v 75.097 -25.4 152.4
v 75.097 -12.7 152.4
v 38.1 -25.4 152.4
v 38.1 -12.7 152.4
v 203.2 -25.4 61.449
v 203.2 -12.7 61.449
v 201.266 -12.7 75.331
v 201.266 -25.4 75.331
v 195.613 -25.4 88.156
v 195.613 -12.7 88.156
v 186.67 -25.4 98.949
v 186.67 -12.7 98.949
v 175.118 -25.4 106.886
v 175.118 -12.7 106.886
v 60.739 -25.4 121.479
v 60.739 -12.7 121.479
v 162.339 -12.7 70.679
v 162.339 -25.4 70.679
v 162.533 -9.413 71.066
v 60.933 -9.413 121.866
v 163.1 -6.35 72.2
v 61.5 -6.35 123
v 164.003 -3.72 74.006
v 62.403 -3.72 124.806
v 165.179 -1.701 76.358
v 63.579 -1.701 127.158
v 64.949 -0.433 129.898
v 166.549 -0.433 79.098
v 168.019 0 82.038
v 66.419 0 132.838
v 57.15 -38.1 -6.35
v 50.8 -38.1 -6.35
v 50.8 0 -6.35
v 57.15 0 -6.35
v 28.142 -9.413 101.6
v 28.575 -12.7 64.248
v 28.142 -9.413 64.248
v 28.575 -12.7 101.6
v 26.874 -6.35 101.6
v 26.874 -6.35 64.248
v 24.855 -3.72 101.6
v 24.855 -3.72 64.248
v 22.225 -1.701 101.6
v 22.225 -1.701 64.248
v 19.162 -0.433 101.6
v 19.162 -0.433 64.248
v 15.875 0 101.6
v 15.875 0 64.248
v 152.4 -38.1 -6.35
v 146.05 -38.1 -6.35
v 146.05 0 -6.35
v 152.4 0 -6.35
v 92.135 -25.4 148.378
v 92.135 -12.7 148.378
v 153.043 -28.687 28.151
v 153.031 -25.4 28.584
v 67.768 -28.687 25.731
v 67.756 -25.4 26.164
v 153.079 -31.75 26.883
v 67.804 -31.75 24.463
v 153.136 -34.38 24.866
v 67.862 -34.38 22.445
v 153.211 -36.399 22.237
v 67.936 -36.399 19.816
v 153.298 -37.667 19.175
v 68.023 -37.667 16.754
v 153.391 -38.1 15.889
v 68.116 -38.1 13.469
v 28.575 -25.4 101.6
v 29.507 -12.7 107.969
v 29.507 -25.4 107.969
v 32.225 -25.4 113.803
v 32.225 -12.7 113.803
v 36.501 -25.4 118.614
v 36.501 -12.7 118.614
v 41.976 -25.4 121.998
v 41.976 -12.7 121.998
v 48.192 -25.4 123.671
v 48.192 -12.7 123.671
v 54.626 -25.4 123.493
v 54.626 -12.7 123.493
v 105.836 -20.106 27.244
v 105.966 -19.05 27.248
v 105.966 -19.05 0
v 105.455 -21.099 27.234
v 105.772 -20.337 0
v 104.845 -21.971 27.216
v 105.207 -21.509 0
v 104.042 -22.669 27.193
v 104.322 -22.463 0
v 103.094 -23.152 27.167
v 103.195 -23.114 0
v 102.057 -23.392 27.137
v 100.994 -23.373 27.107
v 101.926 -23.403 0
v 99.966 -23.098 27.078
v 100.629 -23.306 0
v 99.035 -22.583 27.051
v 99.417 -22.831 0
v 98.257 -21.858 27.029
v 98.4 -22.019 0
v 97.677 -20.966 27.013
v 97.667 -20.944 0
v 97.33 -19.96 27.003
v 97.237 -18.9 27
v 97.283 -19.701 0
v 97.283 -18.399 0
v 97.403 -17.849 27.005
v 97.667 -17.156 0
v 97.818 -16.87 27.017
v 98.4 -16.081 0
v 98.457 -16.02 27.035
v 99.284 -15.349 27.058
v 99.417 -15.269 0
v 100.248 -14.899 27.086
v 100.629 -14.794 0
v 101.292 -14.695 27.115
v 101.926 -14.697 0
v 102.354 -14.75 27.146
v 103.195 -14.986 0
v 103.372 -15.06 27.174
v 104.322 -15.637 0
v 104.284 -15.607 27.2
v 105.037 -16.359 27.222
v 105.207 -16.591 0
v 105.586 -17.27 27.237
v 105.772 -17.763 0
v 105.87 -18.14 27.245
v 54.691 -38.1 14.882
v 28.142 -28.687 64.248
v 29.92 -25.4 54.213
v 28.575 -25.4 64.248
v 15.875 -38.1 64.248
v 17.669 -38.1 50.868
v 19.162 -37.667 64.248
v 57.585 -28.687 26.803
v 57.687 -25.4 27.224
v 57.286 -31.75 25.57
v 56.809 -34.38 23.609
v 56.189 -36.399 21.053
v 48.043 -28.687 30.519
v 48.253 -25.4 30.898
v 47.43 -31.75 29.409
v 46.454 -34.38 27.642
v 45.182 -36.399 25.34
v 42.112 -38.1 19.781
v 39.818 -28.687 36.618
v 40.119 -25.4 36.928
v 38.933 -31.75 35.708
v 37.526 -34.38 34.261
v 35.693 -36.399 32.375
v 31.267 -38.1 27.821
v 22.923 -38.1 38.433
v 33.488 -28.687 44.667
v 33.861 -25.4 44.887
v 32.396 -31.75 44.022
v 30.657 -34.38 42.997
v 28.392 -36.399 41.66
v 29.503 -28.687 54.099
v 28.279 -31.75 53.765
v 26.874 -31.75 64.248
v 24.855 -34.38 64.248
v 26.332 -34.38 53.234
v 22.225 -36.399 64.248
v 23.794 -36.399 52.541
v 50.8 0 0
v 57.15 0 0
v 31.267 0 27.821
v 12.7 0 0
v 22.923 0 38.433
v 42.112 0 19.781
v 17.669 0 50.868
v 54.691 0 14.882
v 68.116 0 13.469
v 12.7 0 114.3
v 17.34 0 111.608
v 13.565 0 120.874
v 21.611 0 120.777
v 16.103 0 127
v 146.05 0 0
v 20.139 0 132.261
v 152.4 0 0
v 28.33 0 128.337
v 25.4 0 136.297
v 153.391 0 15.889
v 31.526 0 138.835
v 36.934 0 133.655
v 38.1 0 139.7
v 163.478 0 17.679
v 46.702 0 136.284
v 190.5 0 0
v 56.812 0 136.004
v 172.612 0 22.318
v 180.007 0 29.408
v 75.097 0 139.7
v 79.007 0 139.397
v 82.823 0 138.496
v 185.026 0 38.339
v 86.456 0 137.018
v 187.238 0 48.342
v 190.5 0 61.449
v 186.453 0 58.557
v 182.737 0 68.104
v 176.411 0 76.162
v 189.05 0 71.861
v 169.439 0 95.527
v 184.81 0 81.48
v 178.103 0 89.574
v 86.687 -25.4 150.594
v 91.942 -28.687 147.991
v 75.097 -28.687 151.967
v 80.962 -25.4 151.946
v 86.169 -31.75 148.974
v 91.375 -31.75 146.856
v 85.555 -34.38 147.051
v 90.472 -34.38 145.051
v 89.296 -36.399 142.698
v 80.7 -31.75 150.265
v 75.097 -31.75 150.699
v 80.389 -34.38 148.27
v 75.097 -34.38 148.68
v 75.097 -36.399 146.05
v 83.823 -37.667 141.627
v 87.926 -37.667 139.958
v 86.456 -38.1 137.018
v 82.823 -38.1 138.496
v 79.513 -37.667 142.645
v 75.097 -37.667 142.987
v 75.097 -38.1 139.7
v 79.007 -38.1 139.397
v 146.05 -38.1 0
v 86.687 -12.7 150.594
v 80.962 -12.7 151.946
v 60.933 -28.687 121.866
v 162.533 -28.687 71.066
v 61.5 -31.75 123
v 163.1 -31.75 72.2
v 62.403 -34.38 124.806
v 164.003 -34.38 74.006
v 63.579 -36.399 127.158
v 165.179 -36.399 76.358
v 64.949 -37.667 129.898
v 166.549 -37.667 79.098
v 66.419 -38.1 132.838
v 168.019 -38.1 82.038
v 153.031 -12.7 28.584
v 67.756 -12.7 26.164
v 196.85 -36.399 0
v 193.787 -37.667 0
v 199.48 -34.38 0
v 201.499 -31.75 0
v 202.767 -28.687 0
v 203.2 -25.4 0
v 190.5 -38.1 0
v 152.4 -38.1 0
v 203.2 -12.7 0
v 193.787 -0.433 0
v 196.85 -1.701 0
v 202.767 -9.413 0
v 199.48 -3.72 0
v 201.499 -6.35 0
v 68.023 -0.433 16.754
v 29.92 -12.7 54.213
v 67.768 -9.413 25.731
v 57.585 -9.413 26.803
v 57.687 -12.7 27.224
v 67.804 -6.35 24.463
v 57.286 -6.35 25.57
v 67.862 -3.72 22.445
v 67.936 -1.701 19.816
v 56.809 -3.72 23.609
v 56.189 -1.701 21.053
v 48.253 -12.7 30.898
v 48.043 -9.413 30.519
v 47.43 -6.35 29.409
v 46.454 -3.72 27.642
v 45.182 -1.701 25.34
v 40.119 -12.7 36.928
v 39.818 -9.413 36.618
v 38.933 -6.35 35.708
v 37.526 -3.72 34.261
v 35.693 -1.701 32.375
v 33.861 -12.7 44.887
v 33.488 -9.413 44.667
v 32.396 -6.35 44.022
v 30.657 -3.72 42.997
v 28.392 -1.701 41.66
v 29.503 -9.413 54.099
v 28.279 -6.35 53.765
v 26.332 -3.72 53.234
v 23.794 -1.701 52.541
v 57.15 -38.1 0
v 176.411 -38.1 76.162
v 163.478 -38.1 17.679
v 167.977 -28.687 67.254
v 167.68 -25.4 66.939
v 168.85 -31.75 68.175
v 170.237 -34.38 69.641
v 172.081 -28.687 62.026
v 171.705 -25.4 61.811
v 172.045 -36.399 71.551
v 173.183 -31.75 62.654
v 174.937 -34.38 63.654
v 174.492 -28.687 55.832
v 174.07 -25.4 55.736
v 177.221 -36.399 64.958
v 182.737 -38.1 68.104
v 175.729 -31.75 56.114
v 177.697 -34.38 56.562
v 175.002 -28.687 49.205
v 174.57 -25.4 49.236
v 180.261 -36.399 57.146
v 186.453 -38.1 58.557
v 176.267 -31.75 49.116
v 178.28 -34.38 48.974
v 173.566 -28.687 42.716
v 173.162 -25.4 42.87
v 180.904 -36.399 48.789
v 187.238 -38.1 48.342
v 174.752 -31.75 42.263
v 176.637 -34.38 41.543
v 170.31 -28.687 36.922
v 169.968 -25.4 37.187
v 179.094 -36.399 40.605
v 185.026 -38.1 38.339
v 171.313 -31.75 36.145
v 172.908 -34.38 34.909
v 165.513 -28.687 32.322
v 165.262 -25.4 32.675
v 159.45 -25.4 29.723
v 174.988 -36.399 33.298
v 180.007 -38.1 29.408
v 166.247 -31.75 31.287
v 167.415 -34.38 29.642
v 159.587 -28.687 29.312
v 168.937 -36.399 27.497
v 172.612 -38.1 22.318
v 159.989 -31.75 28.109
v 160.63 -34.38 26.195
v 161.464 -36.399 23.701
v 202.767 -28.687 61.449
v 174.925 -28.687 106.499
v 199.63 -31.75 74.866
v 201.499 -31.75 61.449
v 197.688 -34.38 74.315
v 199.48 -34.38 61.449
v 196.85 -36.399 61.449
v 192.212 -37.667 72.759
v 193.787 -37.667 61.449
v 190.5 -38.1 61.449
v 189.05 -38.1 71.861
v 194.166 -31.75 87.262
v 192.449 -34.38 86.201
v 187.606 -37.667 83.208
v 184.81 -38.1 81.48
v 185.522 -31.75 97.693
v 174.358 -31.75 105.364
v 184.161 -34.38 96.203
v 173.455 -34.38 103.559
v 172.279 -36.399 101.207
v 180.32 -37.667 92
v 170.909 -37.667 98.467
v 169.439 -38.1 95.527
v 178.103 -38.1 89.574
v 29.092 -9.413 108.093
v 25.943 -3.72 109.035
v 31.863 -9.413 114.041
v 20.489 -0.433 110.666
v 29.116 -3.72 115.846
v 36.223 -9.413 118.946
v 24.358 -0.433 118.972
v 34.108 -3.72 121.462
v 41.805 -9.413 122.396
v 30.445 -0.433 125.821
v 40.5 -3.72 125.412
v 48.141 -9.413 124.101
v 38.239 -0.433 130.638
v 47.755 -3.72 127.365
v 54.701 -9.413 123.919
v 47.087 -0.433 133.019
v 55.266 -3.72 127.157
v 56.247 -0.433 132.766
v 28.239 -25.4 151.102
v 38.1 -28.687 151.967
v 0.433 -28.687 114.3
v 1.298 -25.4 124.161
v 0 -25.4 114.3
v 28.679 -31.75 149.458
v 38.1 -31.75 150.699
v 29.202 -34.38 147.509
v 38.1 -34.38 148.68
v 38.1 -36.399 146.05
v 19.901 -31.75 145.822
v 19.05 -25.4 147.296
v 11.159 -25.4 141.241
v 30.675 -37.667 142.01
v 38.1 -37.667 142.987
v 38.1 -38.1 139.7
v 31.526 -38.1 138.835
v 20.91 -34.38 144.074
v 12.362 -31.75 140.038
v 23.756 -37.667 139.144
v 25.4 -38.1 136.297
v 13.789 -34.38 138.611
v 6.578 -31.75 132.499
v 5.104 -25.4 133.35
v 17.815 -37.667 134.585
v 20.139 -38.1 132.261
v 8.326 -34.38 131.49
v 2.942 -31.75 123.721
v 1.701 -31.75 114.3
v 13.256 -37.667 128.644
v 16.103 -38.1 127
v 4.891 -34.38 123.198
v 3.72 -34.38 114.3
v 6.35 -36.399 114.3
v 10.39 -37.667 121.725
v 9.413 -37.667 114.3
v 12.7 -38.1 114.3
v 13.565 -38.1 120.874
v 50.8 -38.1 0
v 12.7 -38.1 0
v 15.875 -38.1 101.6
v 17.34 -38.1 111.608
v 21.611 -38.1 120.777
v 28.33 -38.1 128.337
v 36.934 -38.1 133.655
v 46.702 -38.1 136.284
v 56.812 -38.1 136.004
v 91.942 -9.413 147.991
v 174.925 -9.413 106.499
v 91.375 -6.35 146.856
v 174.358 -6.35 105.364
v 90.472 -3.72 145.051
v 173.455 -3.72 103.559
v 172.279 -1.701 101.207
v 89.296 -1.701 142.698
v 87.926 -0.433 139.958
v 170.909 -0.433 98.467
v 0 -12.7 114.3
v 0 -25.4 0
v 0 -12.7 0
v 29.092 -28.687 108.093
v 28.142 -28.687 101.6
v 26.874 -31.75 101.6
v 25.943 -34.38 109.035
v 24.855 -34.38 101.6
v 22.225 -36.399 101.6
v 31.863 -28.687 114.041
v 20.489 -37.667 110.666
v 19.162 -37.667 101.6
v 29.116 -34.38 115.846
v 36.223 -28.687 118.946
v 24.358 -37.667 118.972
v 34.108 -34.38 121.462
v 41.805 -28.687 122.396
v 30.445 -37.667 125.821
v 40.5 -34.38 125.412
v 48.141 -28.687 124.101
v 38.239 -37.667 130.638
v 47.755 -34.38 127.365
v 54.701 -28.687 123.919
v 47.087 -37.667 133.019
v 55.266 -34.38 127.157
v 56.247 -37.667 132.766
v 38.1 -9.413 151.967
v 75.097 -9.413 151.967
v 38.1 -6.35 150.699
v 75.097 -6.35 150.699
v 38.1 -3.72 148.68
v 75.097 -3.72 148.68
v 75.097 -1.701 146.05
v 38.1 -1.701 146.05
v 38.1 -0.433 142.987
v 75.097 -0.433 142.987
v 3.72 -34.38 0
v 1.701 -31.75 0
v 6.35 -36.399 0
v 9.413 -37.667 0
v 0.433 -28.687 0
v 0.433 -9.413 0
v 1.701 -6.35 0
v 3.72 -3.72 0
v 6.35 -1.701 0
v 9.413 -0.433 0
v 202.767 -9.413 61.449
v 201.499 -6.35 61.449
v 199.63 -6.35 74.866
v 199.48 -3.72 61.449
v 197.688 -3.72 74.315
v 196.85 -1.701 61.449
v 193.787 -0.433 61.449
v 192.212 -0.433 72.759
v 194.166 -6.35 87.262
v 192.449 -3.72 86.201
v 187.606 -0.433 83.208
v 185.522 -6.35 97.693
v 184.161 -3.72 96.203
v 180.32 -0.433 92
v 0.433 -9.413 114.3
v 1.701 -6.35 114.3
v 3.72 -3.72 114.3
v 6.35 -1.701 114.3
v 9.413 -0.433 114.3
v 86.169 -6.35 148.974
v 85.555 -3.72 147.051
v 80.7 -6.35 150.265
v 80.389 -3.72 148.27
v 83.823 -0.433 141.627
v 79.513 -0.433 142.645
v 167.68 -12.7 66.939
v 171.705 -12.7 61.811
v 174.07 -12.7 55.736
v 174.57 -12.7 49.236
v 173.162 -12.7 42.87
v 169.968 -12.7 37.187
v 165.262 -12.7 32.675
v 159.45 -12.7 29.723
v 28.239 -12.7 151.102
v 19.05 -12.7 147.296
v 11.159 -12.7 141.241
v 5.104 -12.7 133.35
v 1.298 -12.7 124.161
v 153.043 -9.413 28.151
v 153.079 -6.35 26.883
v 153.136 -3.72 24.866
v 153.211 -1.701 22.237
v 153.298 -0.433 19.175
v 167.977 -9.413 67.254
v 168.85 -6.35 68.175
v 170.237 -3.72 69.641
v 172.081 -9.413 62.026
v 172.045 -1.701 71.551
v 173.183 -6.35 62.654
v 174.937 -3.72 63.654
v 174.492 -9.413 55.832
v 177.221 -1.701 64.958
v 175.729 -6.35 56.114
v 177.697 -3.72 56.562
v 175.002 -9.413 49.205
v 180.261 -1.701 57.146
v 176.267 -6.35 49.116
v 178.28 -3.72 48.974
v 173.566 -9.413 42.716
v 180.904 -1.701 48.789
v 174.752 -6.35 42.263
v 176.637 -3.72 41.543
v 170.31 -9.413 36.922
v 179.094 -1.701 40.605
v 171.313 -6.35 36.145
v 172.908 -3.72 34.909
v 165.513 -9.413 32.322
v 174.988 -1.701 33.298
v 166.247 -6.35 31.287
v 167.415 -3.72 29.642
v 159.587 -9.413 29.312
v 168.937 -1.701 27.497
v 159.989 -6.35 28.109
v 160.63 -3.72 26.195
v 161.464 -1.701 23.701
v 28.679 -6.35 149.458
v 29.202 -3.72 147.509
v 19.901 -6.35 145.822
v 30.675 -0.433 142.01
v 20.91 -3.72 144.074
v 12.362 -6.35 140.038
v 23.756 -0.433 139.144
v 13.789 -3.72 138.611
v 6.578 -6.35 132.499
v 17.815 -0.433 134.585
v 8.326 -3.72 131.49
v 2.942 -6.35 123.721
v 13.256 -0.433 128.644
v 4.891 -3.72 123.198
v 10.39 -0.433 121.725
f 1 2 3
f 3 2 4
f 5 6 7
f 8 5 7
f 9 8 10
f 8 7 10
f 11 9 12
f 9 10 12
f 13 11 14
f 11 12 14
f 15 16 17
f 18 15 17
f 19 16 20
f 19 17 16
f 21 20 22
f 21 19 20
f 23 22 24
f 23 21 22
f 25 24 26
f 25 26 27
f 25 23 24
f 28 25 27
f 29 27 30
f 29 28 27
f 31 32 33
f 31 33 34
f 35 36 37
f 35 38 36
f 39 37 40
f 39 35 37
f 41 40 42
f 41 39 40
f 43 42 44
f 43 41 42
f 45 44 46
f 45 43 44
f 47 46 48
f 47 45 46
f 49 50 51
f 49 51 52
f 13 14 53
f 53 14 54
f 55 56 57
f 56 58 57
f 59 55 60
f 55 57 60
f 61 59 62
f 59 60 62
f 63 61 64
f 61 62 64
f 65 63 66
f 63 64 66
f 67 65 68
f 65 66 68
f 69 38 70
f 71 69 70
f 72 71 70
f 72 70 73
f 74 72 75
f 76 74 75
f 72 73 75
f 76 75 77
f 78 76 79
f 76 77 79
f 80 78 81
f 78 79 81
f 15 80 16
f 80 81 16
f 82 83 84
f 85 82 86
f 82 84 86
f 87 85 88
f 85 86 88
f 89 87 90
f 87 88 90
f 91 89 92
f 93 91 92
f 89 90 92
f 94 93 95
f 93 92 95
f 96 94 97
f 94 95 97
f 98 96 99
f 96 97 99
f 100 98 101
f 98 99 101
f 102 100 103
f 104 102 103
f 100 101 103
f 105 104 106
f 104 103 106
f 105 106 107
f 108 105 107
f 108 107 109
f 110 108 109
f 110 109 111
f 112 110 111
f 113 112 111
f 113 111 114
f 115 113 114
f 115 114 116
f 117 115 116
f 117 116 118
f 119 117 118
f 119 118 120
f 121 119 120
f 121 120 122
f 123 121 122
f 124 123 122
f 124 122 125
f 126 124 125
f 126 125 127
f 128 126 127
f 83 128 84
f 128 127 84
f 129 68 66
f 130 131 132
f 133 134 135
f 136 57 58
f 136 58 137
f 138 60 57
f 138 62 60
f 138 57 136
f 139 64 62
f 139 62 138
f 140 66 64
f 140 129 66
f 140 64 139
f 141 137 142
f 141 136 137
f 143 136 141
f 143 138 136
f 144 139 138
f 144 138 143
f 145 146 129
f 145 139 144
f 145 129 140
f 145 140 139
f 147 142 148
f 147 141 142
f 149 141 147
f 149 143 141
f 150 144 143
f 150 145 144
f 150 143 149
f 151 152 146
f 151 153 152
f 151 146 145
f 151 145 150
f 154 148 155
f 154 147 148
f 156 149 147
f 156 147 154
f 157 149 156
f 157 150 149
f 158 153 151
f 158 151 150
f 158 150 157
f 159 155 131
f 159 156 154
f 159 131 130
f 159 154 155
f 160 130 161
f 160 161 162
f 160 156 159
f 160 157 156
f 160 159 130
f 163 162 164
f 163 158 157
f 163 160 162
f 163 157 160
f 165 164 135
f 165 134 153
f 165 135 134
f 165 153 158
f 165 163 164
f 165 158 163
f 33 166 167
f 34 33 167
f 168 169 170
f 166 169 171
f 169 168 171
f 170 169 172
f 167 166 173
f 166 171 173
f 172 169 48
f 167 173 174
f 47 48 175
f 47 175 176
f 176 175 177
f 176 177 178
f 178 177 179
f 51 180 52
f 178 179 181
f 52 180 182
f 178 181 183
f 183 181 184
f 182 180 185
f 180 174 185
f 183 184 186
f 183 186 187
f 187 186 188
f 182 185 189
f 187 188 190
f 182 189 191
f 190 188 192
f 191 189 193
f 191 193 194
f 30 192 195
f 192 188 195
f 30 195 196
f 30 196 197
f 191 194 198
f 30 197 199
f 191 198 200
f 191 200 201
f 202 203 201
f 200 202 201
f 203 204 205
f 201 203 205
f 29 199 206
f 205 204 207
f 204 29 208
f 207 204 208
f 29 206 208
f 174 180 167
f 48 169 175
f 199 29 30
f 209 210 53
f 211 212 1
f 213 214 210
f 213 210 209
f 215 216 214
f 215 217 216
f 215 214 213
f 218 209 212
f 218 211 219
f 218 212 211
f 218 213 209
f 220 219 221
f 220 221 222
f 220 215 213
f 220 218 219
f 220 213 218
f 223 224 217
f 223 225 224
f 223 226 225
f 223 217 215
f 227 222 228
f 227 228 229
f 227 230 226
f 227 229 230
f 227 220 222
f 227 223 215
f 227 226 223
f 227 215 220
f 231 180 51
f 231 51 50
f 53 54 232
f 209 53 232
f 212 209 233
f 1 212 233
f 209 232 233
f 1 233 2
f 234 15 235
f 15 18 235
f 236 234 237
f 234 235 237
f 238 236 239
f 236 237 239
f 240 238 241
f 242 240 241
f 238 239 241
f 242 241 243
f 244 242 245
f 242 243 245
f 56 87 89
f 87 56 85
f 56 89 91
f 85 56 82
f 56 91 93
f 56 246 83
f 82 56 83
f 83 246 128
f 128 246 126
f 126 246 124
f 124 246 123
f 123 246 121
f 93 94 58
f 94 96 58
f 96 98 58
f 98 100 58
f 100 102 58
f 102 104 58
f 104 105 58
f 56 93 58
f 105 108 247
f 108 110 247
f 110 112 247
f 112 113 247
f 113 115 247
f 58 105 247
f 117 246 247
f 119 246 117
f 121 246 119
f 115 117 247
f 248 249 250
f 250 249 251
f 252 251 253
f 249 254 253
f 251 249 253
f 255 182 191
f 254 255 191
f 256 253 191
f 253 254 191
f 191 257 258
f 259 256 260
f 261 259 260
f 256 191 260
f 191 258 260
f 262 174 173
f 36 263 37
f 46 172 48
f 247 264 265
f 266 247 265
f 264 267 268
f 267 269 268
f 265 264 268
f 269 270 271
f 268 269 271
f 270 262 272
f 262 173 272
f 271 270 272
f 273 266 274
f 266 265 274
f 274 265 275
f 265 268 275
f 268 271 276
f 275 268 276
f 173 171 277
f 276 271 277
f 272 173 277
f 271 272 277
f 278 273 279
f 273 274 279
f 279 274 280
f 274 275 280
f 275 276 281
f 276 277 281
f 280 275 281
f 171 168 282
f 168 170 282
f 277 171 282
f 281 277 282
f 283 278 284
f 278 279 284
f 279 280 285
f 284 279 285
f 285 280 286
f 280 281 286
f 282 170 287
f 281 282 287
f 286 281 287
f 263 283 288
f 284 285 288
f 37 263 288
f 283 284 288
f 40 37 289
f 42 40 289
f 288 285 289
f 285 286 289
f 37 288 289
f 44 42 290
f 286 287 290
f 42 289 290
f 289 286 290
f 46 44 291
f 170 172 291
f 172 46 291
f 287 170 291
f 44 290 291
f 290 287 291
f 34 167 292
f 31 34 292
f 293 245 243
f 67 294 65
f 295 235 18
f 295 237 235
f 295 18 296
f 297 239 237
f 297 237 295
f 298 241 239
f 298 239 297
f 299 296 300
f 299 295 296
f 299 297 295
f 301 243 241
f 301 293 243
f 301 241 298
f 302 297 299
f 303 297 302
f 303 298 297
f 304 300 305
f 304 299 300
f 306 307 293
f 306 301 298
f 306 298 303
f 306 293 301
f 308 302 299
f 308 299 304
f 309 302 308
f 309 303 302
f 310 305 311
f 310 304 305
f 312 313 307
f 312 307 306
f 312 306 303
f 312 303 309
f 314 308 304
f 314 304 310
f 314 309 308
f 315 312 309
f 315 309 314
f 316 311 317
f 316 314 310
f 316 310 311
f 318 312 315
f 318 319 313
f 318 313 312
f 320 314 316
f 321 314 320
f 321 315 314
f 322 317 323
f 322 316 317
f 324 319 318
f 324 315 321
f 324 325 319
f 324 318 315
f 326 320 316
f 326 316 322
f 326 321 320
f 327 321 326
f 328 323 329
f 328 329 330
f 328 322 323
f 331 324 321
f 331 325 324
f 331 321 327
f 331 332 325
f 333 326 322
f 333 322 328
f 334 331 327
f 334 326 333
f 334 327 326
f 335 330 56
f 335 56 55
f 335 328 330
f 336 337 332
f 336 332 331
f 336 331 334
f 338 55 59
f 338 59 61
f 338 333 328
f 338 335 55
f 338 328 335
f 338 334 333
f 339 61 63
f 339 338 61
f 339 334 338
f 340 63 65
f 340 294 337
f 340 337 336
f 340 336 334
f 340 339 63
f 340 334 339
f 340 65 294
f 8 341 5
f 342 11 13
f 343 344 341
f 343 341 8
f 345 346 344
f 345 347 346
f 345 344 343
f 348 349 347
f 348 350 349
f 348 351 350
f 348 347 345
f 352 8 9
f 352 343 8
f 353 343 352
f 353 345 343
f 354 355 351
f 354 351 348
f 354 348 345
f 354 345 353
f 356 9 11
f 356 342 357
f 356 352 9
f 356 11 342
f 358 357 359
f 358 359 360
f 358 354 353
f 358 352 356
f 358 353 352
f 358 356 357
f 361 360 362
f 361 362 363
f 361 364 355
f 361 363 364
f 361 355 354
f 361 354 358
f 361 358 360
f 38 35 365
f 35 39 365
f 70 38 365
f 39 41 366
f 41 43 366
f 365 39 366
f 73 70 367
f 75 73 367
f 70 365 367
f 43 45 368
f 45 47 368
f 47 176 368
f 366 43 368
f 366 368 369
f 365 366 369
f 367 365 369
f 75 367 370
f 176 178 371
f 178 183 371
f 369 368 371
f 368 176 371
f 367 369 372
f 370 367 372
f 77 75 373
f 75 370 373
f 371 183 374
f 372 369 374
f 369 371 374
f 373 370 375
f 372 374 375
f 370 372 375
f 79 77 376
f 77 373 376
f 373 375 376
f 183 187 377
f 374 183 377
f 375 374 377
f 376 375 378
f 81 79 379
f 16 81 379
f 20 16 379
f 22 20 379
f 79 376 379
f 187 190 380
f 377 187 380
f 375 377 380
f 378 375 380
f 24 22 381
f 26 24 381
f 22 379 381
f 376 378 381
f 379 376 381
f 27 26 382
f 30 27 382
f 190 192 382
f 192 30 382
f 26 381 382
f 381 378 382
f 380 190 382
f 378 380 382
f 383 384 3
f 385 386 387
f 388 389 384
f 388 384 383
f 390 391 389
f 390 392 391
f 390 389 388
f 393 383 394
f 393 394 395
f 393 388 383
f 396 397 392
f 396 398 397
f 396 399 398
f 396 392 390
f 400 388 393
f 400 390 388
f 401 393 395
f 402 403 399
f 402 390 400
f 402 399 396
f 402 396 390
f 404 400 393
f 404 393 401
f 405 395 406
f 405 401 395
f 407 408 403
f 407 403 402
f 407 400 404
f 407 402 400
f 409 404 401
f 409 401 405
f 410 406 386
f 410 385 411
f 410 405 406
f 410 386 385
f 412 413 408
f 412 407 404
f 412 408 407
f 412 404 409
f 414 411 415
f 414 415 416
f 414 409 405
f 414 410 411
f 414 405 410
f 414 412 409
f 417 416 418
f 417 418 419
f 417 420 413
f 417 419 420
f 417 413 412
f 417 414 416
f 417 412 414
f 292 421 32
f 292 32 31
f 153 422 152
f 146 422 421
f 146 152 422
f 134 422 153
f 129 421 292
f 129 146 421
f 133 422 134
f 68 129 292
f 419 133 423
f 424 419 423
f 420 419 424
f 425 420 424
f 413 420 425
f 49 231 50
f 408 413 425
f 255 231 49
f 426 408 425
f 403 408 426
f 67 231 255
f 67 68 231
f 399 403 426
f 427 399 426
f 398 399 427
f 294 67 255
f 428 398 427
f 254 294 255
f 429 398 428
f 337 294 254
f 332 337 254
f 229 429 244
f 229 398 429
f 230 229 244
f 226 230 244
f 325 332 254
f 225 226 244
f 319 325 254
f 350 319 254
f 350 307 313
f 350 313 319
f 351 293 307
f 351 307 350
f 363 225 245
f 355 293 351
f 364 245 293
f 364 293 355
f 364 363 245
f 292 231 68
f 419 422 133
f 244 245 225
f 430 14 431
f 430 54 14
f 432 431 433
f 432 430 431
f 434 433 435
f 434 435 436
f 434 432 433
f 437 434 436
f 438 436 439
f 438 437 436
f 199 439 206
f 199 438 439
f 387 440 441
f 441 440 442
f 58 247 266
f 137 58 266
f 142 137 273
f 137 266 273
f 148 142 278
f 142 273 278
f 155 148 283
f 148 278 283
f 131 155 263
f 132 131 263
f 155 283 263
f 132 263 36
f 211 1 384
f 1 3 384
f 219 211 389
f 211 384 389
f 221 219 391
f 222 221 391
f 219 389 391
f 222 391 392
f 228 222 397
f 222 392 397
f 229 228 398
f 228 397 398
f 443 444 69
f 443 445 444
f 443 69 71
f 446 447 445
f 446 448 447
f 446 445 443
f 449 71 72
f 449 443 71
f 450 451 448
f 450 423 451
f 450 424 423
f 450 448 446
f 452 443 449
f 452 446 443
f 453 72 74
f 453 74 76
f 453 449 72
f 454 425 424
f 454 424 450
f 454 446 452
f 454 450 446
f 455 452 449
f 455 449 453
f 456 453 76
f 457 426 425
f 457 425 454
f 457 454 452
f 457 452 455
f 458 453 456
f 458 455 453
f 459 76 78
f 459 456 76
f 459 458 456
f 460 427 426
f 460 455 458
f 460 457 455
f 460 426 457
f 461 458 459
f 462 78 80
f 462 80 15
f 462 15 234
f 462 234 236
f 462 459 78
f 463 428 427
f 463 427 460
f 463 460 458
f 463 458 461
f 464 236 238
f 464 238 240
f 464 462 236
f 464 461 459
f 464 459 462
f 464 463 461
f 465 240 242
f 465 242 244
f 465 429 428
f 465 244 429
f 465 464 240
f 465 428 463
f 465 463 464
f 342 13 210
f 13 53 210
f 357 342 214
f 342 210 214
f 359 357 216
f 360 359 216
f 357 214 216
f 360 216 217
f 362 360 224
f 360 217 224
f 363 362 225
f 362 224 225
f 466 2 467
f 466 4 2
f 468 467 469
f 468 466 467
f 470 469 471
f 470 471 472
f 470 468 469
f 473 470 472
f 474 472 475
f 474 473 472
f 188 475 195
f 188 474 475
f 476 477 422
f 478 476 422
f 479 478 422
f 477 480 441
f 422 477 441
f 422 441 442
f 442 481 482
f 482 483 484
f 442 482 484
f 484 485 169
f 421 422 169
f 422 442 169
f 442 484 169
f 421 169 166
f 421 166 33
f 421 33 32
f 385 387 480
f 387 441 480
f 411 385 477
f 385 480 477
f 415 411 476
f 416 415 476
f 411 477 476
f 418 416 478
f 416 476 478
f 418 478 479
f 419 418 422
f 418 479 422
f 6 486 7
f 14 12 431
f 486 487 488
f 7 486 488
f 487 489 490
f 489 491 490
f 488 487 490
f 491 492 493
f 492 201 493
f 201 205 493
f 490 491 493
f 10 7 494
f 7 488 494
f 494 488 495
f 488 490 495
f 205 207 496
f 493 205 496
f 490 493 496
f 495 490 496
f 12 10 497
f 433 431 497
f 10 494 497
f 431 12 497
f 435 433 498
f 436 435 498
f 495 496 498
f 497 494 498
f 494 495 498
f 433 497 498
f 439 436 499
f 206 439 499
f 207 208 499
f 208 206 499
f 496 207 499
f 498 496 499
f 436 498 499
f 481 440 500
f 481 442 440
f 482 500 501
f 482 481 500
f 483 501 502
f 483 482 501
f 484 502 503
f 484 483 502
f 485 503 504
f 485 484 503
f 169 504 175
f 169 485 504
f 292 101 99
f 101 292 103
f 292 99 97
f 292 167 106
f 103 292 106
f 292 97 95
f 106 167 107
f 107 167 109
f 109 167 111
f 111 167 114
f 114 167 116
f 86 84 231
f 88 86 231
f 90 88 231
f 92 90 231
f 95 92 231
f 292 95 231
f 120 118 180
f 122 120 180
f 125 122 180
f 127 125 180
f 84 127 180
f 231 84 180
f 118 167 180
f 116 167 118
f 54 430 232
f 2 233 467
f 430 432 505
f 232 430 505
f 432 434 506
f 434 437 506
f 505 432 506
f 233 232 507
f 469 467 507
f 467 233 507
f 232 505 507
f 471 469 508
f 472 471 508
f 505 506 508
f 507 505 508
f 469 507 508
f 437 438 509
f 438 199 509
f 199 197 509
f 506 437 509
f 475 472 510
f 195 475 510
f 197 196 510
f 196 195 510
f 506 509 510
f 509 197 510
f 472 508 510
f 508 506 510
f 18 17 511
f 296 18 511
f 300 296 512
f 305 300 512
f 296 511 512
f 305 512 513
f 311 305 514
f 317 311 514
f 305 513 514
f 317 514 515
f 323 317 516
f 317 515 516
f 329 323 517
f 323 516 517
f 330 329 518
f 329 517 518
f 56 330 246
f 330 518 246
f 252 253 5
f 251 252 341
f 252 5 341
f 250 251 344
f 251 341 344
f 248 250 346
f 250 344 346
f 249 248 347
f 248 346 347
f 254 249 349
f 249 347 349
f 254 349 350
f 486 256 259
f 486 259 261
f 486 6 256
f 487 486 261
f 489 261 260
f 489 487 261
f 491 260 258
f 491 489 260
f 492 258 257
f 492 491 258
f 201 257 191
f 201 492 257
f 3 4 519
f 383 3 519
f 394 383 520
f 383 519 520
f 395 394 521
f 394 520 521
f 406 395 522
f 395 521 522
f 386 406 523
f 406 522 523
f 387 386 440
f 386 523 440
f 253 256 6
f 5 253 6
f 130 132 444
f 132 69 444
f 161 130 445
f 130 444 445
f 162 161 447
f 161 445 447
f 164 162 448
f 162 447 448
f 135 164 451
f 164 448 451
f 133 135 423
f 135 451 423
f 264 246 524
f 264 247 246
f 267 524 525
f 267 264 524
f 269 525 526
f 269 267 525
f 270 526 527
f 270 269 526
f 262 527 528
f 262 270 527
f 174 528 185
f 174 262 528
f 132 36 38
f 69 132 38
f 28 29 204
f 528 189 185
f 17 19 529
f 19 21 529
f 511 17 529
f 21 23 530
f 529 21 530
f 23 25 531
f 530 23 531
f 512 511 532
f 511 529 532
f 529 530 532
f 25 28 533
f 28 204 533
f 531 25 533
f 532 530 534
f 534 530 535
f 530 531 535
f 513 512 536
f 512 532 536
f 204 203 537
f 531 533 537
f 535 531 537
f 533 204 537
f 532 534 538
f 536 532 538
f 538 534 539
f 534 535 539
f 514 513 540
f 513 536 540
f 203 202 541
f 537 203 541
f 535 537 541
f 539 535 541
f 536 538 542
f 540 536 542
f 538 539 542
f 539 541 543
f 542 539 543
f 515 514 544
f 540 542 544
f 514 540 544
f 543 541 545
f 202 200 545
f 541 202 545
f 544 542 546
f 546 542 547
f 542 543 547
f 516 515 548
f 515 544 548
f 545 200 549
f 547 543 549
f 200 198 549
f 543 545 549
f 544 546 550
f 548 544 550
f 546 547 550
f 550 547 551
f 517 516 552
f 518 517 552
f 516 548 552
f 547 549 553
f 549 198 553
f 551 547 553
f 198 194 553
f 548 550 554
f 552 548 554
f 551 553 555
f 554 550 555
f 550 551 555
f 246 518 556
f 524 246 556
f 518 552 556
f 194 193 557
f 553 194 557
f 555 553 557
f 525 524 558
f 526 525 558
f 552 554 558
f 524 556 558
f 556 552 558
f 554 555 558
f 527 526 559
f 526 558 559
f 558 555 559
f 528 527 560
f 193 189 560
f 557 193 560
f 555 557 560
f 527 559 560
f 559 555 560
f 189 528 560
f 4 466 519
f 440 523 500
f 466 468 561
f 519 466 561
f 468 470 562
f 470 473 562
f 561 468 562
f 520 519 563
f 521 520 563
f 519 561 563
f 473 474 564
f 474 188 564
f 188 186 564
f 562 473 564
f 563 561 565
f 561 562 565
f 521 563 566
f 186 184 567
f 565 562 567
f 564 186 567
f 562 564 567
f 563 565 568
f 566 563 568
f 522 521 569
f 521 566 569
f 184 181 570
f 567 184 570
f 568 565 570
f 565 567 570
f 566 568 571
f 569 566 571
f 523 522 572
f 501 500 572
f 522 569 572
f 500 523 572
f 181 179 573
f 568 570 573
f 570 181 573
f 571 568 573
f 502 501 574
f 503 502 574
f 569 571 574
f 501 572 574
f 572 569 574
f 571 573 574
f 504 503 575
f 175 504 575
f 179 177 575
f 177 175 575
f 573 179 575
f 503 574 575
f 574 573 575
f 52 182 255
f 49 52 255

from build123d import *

# Parameters (mm, degrees)
F1_DEPTH = 38.1
F2_R     = 12.7
F3_R     = 4.365625
F4_DEPTH = 27.2490523559
F5_W     = 6.35
F5_H     = 38.1
F6_DEPTH = 6.35


with BuildPart() as f1:
    # F0 (on Front) → F1 (new body)
    with BuildSketch(Plane.XZ):
        with BuildLine():
            Line((0, 114.3), (0, 0))
            Line((0, 0), (203.2, 0))
            Line((203.2, 0), (203.2, 61.4492737428))
            ThreePointArc((203.2, 61.4492737428), (195.6130610643, 88.1564142385), (175.1184506514, 106.8861750456))
            Line((175.1184506514, 106.8861750456), (92.1354487885, 148.3776759771))
            ThreePointArc((92.1354487885, 148.3776759771), (83.8501970728, 151.3807864987), (75.0966107999, 152.4))
            Line((75.0966107999, 152.4), (38.1, 152.4))
            ThreePointArc((38.1, 152.4), (11.1592316368, 141.2407683632), (0, 114.3))
        make_face()
        with BuildLine():
            ThreePointArc((28.575, 101.6), (39.1156260332, 120.5057142156), (60.73932216, 121.47864432))
            Line((60.73932216, 121.47864432), (162.33932216, 70.67864432))
            ThreePointArc((162.33932216, 70.67864432), (174.100727981, 46.0011428347), (153.0305820147, 28.5839474406))
            Line((153.0305820147, 28.5839474406), (67.7559977395, 26.1635075802))
            ThreePointArc((67.7559977395, 26.1635075802), (40.119172145, 36.9278834801), (28.575, 64.2481691106))
            Line((28.575, 64.2481691106), (28.575, 101.6))
        make_face(mode=Mode.SUBTRACT)
    extrude(amount=F1_DEPTH)

    # F2
    f2_edges = [f1.edges().sort_by_distance(p)[0] for p in [
        (56.598305, -38.1, 152.4),
        (111.539322, -38.1, 96.078644),
        (111.539322, 0, 96.078644),
        (133.62695, 0, 127.631926),
    ]]
    fillet(f2_edges, radius=F2_R)

    # F3 (on face) → F4 (cut, through all)
    with BuildSketch(Plane(origin=(0, 0, 0), x_dir=(1, 0, 0), z_dir=(0, 0, -1))):
        with Locations((101.6, 19.05)):
            Circle(F3_R)
    extrude(amount=-F4_DEPTH, mode=Mode.SUBTRACT)

    # F5 (on face) → F6 (join)
    with BuildSketch(Plane(origin=(0, 0, 0), x_dir=(1, 0, 0), z_dir=(0, 0, -1))):
        with Locations((53.975, 19.05)):
            Rectangle(F5_W, F5_H)
        with Locations((149.225, 19.05)):
            Rectangle(F5_W, F5_H)
    extrude(amount=F6_DEPTH)


solid = f1.part
